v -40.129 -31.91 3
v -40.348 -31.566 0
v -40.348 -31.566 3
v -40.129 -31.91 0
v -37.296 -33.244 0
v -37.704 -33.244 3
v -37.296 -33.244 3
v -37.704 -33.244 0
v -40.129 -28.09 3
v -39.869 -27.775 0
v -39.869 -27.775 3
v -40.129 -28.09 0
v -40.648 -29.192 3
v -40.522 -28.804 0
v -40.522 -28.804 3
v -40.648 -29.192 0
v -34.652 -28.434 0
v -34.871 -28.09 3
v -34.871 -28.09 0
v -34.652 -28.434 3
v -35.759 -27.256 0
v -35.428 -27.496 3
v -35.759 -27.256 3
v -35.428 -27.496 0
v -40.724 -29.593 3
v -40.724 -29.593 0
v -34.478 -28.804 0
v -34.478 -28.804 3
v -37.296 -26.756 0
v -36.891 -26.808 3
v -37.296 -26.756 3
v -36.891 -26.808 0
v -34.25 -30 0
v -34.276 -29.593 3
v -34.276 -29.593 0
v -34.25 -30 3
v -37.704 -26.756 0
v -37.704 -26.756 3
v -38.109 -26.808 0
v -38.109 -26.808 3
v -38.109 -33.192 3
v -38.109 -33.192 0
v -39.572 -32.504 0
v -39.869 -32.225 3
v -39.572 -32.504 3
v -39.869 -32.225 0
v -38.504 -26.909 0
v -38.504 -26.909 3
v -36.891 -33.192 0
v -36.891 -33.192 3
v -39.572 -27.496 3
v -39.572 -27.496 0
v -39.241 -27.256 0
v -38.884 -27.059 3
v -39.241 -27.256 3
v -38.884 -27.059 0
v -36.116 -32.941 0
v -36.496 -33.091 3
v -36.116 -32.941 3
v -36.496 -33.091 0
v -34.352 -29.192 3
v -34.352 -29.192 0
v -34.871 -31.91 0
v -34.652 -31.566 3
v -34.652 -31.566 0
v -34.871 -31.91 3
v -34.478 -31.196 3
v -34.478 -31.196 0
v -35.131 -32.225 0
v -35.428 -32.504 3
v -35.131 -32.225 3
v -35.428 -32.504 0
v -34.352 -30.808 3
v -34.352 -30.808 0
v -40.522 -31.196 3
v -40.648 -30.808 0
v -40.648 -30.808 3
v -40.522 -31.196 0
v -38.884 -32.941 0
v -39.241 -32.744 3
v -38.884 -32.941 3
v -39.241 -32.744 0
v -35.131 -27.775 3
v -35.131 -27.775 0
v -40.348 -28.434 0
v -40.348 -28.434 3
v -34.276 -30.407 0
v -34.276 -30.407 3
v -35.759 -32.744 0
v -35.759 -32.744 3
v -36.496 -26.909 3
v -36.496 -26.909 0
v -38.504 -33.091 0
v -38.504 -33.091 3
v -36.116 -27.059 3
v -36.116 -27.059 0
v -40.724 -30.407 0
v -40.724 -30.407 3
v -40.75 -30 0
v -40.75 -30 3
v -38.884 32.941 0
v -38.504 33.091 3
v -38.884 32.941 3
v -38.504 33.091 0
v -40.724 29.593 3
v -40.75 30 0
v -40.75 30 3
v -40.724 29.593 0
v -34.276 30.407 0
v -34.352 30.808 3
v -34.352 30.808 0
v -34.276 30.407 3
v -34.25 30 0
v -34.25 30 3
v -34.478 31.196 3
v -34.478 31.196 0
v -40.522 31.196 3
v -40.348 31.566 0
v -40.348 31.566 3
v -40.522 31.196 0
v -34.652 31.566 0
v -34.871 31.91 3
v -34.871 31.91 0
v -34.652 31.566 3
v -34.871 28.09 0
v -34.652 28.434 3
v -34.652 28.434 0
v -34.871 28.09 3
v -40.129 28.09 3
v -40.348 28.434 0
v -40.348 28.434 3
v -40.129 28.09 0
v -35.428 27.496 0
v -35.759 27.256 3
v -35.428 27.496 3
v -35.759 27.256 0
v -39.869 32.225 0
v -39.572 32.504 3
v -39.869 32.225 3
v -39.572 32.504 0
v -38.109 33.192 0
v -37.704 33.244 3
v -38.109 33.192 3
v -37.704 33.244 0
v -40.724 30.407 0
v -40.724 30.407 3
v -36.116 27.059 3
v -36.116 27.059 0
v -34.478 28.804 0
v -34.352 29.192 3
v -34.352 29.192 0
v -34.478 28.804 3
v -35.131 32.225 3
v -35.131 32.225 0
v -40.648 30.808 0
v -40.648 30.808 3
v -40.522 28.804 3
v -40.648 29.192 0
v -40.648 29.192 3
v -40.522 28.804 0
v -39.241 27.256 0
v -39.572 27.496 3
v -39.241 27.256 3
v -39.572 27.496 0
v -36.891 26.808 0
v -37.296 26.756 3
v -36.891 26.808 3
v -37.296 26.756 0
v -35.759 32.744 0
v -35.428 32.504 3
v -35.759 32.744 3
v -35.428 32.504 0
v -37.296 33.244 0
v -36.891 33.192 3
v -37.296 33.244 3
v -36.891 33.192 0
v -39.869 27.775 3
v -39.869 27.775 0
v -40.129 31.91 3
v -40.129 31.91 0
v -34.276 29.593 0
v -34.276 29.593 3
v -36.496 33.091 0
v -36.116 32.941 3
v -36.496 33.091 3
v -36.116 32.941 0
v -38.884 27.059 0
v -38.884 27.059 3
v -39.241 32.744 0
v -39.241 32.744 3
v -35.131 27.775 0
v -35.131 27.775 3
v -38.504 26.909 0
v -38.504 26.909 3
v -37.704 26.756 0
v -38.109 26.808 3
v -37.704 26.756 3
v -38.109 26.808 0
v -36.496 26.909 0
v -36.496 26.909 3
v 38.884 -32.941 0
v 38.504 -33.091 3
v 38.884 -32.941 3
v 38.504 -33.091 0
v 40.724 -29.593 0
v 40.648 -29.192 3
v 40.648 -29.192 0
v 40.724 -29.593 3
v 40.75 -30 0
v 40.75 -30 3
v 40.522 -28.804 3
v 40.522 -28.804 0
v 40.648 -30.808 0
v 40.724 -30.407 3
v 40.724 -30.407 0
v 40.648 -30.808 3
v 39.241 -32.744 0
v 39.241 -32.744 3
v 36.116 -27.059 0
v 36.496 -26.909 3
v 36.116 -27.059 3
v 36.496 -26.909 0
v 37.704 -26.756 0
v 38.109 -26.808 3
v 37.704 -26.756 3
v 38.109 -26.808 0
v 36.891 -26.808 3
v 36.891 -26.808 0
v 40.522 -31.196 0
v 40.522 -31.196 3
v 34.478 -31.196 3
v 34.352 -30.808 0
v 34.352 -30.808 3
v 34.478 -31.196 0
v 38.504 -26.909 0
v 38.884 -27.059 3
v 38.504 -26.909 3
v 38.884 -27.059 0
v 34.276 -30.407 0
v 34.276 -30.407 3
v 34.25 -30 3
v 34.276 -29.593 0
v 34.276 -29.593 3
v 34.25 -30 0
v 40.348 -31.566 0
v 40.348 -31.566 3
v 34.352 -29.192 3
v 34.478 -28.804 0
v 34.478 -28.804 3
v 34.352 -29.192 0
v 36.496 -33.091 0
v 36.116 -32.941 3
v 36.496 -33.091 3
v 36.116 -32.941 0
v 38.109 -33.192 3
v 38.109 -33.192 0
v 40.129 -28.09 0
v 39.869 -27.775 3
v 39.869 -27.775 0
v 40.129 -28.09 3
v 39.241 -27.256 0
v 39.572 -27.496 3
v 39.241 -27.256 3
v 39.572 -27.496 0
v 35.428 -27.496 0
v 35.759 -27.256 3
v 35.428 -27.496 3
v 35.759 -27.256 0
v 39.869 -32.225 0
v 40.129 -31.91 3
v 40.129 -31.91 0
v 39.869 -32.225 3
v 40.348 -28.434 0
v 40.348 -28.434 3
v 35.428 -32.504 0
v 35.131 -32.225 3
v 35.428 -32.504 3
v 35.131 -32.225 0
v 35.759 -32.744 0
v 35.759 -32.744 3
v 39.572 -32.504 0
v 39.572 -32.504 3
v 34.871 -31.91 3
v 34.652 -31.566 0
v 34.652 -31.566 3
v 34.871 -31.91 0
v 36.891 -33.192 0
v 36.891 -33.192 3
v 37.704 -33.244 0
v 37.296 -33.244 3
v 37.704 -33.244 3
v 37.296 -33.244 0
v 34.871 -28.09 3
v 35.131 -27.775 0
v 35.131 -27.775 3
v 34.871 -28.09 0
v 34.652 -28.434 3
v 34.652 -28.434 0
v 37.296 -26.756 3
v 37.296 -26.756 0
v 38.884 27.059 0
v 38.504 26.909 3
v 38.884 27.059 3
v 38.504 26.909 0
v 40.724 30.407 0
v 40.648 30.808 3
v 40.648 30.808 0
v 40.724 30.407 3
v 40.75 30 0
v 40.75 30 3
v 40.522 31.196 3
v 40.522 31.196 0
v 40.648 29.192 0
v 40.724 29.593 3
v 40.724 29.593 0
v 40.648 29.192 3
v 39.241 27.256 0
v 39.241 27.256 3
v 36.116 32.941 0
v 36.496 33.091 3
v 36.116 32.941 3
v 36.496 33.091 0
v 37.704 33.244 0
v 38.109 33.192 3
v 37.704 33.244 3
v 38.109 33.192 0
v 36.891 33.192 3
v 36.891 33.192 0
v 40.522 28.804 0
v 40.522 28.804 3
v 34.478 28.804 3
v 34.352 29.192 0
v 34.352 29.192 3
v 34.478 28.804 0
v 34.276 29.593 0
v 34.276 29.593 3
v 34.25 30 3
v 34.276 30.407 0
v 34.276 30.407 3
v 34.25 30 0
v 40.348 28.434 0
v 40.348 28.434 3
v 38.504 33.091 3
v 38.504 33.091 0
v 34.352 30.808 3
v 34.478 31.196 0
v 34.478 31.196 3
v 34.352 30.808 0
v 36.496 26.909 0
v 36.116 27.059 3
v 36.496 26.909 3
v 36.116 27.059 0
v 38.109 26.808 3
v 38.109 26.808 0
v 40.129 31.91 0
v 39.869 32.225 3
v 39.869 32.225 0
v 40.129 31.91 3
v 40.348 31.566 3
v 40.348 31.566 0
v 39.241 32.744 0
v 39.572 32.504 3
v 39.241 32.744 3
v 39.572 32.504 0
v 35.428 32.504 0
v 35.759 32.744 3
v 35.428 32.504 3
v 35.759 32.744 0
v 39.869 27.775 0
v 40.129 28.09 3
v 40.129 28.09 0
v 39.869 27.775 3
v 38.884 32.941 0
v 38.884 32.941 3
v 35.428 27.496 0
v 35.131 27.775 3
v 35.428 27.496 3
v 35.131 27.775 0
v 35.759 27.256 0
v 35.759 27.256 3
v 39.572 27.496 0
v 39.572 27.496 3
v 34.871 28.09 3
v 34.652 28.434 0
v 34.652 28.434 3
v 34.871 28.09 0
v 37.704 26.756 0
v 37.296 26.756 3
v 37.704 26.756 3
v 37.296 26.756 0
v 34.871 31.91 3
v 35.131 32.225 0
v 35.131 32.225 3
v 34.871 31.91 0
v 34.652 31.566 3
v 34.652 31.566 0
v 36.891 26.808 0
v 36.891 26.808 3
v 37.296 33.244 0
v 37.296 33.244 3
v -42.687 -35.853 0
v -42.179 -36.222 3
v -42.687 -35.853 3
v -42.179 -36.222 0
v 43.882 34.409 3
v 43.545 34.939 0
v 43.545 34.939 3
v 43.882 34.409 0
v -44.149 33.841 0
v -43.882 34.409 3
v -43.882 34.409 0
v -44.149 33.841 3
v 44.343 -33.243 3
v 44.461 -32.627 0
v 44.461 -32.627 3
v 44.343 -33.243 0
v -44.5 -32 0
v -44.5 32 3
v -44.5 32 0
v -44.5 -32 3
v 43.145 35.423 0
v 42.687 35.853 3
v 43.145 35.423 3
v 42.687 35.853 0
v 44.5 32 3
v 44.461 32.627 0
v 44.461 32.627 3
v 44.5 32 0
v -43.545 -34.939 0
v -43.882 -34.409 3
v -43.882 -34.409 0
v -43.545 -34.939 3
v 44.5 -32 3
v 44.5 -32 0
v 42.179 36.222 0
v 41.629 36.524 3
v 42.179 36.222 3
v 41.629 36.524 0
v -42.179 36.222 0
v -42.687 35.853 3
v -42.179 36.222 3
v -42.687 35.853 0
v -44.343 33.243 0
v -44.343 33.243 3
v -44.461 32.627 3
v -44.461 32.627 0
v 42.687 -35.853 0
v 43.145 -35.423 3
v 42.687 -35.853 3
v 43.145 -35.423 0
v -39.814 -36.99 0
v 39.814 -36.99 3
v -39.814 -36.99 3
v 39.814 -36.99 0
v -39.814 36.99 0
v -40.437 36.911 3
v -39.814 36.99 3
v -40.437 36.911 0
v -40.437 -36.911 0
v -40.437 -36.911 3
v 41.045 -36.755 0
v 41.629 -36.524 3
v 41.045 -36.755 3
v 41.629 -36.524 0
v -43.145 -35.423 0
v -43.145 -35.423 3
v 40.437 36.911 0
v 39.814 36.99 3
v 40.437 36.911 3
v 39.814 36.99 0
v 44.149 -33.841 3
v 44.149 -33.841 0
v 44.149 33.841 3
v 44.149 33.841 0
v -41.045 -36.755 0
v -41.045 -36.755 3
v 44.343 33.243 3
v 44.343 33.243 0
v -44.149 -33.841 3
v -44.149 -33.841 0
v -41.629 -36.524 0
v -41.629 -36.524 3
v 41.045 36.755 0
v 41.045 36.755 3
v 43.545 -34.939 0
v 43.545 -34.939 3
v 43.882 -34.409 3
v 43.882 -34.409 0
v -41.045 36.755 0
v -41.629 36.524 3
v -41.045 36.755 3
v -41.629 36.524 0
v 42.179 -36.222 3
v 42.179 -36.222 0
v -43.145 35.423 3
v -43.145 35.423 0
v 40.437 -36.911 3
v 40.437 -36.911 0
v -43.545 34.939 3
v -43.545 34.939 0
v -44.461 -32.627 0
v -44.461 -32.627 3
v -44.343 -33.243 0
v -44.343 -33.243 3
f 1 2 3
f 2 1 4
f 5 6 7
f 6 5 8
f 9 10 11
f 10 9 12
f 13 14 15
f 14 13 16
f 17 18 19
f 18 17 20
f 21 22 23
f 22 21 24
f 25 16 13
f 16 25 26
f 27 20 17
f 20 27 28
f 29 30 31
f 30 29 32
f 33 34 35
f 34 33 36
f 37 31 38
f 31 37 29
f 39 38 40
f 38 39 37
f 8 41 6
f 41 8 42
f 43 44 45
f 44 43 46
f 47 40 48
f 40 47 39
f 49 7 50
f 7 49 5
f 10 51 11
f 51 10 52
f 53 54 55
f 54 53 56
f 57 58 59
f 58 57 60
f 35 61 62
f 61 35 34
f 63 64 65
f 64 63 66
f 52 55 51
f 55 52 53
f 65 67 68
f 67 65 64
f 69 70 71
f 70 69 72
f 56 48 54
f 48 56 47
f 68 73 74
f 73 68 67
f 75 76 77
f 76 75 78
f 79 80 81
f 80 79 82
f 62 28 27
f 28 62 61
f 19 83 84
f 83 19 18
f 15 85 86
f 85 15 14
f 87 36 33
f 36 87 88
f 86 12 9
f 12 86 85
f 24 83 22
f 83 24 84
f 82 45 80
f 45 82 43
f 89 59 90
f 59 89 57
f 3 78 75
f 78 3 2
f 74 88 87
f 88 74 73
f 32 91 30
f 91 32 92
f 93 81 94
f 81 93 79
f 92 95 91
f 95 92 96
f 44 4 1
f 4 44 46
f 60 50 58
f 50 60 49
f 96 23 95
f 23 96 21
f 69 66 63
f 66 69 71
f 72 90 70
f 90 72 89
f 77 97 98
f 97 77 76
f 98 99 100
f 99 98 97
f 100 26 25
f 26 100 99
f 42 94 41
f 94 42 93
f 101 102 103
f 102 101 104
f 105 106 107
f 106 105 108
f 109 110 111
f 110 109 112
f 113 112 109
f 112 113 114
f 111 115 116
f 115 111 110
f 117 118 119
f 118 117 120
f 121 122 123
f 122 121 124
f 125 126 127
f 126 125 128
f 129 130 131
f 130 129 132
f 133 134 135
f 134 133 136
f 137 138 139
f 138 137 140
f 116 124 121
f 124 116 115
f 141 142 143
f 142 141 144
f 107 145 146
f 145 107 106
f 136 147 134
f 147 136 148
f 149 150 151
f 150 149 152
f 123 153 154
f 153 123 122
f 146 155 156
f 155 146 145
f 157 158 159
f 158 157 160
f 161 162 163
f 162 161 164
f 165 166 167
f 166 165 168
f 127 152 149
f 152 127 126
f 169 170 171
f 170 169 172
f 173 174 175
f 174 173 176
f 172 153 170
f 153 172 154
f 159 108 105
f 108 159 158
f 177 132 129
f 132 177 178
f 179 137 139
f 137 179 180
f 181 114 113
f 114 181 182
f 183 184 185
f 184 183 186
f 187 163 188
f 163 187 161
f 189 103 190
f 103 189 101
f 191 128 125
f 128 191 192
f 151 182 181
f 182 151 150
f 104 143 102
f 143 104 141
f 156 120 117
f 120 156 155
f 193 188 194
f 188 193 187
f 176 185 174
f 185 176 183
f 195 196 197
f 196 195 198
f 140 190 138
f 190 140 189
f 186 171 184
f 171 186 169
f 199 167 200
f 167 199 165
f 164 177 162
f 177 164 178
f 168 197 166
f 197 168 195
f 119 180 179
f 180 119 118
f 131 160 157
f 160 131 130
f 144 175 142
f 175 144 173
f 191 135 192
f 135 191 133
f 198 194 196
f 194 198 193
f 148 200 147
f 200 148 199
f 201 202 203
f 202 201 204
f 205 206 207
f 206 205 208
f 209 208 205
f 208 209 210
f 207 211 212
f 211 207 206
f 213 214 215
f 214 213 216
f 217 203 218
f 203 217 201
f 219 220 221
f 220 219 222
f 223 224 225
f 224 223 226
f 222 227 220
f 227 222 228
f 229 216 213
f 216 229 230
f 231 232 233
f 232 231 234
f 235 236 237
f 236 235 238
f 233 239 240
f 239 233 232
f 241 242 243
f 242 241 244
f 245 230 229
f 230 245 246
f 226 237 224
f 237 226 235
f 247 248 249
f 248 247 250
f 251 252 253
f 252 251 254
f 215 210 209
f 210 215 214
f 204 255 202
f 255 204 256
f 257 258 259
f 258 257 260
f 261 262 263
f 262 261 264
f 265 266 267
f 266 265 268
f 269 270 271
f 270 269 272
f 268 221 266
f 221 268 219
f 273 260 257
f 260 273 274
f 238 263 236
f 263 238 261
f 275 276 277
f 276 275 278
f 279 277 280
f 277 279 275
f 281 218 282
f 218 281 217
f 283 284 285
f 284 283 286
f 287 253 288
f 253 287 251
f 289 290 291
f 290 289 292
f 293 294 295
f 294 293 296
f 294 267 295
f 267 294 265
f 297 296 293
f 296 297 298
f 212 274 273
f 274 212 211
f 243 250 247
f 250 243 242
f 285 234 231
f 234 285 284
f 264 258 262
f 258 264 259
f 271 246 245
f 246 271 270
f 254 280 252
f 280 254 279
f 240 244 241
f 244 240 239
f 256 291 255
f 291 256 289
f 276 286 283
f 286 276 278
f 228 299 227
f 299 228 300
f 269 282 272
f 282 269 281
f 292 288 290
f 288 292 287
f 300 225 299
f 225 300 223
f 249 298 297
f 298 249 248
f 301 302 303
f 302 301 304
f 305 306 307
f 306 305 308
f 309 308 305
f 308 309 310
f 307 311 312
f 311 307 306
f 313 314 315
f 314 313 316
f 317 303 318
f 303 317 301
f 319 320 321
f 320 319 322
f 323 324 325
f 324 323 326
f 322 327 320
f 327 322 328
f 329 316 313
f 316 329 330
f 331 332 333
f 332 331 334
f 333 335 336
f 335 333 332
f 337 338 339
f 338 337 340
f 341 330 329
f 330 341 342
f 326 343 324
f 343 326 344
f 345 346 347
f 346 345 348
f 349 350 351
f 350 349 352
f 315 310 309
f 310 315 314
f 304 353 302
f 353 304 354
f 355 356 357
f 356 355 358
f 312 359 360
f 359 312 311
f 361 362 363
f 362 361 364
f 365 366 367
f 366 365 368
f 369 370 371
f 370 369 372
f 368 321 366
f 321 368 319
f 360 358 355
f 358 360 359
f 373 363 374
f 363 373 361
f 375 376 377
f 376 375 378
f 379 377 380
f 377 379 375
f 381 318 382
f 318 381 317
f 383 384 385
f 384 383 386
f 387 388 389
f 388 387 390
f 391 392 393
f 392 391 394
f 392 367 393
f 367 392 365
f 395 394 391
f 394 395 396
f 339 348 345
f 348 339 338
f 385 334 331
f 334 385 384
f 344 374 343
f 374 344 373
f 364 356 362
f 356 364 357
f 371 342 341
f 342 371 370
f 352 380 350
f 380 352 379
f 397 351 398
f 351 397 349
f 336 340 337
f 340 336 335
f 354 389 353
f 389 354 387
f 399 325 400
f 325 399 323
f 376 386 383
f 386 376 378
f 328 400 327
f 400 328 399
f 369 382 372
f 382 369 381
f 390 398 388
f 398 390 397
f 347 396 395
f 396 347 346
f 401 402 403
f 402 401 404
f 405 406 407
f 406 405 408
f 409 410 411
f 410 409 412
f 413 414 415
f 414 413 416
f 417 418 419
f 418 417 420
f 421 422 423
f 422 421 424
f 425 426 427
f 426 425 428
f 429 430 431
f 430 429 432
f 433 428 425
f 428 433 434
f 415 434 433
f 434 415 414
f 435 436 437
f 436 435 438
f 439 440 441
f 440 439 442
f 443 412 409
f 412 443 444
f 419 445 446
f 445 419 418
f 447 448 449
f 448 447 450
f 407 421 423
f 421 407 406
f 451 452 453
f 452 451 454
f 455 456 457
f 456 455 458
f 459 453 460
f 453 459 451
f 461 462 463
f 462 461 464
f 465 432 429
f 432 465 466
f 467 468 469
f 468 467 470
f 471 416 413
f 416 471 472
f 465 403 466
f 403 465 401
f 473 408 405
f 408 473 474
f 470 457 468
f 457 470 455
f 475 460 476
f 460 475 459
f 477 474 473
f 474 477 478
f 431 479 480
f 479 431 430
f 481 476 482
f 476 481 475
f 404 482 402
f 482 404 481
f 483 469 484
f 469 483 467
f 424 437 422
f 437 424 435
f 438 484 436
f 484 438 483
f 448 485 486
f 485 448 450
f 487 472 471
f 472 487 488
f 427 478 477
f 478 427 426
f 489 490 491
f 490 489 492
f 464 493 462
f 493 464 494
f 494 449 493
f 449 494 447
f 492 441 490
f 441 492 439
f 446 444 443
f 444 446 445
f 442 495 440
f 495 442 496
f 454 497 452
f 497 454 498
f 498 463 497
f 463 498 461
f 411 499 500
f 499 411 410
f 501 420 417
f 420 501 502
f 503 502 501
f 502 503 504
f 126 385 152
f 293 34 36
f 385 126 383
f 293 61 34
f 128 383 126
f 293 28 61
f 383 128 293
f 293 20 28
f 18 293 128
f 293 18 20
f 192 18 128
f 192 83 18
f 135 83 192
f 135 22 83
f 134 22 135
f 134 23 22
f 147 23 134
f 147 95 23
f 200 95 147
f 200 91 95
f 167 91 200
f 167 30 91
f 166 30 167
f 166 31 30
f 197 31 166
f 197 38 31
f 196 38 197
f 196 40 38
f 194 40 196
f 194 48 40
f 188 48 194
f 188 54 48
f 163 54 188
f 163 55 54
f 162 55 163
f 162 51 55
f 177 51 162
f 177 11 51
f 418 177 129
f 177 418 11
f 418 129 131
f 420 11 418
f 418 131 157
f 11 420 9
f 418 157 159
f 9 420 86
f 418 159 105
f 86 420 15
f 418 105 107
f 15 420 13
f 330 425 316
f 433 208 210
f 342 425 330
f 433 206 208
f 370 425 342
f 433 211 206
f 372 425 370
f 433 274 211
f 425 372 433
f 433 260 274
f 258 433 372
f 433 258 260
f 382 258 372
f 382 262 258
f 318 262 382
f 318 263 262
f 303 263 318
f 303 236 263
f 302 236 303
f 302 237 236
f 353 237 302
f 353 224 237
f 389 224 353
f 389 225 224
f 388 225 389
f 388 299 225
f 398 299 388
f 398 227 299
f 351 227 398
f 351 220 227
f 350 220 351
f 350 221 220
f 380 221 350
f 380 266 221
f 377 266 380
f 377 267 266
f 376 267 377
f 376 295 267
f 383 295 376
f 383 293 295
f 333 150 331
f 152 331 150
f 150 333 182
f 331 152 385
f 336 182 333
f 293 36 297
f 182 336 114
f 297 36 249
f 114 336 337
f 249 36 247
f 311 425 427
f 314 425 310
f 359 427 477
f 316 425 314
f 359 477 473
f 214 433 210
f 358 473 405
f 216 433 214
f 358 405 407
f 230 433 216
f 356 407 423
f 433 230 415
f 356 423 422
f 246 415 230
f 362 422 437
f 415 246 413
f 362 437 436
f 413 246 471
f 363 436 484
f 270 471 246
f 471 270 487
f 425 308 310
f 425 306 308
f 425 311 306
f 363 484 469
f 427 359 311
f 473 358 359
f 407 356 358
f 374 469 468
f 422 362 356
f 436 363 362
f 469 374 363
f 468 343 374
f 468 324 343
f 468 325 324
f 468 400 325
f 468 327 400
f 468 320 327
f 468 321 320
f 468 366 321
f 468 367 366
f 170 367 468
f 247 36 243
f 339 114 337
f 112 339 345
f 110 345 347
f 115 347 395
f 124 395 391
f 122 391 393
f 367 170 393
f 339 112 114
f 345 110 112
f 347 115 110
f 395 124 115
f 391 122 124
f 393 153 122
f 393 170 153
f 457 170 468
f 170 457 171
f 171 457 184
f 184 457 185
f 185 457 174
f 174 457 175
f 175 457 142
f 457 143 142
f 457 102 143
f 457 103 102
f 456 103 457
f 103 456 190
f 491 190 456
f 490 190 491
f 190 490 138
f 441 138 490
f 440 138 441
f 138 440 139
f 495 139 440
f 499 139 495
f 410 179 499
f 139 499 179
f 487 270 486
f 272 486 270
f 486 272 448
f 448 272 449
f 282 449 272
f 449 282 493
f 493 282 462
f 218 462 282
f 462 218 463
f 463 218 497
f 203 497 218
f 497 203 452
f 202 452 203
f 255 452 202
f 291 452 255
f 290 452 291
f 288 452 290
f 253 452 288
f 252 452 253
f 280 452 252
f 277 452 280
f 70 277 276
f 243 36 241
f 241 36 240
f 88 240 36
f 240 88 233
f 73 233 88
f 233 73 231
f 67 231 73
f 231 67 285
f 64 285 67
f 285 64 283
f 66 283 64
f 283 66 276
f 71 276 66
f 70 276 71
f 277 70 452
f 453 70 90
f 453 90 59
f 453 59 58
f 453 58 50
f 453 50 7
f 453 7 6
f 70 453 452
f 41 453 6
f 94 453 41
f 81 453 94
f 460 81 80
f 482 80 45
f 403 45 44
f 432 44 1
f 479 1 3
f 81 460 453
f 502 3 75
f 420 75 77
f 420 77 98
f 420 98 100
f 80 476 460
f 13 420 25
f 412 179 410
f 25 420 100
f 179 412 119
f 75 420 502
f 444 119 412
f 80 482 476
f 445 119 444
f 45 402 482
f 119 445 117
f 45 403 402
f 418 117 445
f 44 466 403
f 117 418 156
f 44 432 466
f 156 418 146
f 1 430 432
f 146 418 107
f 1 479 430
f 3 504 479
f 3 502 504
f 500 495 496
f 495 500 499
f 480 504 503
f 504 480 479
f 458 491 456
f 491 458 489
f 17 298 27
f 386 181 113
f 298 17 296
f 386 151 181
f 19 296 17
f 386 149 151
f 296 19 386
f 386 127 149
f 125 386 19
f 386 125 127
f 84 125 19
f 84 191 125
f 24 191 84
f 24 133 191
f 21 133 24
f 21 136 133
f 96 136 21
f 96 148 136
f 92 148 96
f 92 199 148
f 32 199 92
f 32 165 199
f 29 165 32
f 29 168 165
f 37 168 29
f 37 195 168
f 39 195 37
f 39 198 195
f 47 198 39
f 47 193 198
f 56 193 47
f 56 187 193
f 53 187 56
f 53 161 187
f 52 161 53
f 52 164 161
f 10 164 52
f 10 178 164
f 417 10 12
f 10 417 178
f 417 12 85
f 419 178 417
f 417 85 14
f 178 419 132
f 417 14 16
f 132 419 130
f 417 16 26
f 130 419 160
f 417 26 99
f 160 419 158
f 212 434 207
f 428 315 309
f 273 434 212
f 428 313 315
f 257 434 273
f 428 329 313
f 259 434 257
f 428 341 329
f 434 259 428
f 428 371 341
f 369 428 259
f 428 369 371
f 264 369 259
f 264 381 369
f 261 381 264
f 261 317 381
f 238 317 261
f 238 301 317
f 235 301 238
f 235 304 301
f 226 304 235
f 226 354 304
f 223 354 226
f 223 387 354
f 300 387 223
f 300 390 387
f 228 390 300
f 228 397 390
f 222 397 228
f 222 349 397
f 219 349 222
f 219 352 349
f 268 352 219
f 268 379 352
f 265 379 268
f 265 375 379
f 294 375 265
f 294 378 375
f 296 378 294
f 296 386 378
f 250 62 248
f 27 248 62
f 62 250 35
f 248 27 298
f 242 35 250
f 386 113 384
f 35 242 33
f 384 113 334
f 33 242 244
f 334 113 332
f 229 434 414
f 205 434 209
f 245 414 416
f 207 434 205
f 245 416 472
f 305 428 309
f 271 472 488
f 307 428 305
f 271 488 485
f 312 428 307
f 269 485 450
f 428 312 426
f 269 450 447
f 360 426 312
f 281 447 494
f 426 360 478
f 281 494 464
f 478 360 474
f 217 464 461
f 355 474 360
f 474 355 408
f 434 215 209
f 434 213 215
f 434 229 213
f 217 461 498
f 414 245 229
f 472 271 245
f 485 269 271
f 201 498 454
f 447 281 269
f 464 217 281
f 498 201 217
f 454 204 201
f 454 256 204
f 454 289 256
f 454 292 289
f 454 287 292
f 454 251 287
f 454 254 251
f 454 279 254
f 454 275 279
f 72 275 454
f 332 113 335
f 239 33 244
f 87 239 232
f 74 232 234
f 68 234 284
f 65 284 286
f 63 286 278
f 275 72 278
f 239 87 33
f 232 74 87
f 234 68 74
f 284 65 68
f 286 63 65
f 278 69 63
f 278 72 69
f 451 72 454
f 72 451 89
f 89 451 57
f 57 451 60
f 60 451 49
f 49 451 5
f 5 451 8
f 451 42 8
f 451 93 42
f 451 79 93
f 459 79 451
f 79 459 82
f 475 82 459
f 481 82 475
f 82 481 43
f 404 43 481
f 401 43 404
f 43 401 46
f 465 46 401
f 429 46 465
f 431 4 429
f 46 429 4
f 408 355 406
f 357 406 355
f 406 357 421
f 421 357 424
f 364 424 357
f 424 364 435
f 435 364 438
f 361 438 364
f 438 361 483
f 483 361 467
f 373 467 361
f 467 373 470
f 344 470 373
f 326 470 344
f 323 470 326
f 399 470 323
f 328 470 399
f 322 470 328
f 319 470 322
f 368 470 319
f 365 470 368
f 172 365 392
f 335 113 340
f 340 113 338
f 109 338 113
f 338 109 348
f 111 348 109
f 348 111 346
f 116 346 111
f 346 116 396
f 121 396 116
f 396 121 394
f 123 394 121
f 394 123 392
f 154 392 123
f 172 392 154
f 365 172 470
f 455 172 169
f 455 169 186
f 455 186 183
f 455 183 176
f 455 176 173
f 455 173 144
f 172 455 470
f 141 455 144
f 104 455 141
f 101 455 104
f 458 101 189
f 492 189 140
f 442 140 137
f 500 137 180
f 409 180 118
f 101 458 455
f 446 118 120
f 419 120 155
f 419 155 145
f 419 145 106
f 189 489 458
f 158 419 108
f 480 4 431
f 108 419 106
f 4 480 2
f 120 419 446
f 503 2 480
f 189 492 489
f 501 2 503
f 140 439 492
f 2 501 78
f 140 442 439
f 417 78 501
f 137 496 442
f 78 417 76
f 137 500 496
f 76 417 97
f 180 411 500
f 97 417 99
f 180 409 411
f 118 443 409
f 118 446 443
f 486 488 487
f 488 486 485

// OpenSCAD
$fn = 50;


difference() {
	union() {
		hull() {
			translate(v = [-39.5000000000, 32.0000000000, 0]) {
				cylinder(h = 3, r = 5);
			}
			translate(v = [39.5000000000, 32.0000000000, 0]) {
				cylinder(h = 3, r = 5);
			}
			translate(v = [-39.5000000000, -32.0000000000, 0]) {
				cylinder(h = 3, r = 5);
			}
			translate(v = [39.5000000000, -32.0000000000, 0]) {
				cylinder(h = 3, r = 5);
			}
		}
	}
	union() {
		translate(v = [-37.5000000000, -30.0000000000, -100.0000000000]) {
			cylinder(h = 200, r = 3.2500000000);
		}
		translate(v = [-37.5000000000, 30.0000000000, -100.0000000000]) {
			cylinder(h = 200, r = 3.2500000000);
		}
		translate(v = [37.5000000000, -30.0000000000, -100.0000000000]) {
			cylinder(h = 200, r = 3.2500000000);
		}
		translate(v = [37.5000000000, 30.0000000000, -100.0000000000]) {
			cylinder(h = 200, r = 3.2500000000);
		}
	}
}
